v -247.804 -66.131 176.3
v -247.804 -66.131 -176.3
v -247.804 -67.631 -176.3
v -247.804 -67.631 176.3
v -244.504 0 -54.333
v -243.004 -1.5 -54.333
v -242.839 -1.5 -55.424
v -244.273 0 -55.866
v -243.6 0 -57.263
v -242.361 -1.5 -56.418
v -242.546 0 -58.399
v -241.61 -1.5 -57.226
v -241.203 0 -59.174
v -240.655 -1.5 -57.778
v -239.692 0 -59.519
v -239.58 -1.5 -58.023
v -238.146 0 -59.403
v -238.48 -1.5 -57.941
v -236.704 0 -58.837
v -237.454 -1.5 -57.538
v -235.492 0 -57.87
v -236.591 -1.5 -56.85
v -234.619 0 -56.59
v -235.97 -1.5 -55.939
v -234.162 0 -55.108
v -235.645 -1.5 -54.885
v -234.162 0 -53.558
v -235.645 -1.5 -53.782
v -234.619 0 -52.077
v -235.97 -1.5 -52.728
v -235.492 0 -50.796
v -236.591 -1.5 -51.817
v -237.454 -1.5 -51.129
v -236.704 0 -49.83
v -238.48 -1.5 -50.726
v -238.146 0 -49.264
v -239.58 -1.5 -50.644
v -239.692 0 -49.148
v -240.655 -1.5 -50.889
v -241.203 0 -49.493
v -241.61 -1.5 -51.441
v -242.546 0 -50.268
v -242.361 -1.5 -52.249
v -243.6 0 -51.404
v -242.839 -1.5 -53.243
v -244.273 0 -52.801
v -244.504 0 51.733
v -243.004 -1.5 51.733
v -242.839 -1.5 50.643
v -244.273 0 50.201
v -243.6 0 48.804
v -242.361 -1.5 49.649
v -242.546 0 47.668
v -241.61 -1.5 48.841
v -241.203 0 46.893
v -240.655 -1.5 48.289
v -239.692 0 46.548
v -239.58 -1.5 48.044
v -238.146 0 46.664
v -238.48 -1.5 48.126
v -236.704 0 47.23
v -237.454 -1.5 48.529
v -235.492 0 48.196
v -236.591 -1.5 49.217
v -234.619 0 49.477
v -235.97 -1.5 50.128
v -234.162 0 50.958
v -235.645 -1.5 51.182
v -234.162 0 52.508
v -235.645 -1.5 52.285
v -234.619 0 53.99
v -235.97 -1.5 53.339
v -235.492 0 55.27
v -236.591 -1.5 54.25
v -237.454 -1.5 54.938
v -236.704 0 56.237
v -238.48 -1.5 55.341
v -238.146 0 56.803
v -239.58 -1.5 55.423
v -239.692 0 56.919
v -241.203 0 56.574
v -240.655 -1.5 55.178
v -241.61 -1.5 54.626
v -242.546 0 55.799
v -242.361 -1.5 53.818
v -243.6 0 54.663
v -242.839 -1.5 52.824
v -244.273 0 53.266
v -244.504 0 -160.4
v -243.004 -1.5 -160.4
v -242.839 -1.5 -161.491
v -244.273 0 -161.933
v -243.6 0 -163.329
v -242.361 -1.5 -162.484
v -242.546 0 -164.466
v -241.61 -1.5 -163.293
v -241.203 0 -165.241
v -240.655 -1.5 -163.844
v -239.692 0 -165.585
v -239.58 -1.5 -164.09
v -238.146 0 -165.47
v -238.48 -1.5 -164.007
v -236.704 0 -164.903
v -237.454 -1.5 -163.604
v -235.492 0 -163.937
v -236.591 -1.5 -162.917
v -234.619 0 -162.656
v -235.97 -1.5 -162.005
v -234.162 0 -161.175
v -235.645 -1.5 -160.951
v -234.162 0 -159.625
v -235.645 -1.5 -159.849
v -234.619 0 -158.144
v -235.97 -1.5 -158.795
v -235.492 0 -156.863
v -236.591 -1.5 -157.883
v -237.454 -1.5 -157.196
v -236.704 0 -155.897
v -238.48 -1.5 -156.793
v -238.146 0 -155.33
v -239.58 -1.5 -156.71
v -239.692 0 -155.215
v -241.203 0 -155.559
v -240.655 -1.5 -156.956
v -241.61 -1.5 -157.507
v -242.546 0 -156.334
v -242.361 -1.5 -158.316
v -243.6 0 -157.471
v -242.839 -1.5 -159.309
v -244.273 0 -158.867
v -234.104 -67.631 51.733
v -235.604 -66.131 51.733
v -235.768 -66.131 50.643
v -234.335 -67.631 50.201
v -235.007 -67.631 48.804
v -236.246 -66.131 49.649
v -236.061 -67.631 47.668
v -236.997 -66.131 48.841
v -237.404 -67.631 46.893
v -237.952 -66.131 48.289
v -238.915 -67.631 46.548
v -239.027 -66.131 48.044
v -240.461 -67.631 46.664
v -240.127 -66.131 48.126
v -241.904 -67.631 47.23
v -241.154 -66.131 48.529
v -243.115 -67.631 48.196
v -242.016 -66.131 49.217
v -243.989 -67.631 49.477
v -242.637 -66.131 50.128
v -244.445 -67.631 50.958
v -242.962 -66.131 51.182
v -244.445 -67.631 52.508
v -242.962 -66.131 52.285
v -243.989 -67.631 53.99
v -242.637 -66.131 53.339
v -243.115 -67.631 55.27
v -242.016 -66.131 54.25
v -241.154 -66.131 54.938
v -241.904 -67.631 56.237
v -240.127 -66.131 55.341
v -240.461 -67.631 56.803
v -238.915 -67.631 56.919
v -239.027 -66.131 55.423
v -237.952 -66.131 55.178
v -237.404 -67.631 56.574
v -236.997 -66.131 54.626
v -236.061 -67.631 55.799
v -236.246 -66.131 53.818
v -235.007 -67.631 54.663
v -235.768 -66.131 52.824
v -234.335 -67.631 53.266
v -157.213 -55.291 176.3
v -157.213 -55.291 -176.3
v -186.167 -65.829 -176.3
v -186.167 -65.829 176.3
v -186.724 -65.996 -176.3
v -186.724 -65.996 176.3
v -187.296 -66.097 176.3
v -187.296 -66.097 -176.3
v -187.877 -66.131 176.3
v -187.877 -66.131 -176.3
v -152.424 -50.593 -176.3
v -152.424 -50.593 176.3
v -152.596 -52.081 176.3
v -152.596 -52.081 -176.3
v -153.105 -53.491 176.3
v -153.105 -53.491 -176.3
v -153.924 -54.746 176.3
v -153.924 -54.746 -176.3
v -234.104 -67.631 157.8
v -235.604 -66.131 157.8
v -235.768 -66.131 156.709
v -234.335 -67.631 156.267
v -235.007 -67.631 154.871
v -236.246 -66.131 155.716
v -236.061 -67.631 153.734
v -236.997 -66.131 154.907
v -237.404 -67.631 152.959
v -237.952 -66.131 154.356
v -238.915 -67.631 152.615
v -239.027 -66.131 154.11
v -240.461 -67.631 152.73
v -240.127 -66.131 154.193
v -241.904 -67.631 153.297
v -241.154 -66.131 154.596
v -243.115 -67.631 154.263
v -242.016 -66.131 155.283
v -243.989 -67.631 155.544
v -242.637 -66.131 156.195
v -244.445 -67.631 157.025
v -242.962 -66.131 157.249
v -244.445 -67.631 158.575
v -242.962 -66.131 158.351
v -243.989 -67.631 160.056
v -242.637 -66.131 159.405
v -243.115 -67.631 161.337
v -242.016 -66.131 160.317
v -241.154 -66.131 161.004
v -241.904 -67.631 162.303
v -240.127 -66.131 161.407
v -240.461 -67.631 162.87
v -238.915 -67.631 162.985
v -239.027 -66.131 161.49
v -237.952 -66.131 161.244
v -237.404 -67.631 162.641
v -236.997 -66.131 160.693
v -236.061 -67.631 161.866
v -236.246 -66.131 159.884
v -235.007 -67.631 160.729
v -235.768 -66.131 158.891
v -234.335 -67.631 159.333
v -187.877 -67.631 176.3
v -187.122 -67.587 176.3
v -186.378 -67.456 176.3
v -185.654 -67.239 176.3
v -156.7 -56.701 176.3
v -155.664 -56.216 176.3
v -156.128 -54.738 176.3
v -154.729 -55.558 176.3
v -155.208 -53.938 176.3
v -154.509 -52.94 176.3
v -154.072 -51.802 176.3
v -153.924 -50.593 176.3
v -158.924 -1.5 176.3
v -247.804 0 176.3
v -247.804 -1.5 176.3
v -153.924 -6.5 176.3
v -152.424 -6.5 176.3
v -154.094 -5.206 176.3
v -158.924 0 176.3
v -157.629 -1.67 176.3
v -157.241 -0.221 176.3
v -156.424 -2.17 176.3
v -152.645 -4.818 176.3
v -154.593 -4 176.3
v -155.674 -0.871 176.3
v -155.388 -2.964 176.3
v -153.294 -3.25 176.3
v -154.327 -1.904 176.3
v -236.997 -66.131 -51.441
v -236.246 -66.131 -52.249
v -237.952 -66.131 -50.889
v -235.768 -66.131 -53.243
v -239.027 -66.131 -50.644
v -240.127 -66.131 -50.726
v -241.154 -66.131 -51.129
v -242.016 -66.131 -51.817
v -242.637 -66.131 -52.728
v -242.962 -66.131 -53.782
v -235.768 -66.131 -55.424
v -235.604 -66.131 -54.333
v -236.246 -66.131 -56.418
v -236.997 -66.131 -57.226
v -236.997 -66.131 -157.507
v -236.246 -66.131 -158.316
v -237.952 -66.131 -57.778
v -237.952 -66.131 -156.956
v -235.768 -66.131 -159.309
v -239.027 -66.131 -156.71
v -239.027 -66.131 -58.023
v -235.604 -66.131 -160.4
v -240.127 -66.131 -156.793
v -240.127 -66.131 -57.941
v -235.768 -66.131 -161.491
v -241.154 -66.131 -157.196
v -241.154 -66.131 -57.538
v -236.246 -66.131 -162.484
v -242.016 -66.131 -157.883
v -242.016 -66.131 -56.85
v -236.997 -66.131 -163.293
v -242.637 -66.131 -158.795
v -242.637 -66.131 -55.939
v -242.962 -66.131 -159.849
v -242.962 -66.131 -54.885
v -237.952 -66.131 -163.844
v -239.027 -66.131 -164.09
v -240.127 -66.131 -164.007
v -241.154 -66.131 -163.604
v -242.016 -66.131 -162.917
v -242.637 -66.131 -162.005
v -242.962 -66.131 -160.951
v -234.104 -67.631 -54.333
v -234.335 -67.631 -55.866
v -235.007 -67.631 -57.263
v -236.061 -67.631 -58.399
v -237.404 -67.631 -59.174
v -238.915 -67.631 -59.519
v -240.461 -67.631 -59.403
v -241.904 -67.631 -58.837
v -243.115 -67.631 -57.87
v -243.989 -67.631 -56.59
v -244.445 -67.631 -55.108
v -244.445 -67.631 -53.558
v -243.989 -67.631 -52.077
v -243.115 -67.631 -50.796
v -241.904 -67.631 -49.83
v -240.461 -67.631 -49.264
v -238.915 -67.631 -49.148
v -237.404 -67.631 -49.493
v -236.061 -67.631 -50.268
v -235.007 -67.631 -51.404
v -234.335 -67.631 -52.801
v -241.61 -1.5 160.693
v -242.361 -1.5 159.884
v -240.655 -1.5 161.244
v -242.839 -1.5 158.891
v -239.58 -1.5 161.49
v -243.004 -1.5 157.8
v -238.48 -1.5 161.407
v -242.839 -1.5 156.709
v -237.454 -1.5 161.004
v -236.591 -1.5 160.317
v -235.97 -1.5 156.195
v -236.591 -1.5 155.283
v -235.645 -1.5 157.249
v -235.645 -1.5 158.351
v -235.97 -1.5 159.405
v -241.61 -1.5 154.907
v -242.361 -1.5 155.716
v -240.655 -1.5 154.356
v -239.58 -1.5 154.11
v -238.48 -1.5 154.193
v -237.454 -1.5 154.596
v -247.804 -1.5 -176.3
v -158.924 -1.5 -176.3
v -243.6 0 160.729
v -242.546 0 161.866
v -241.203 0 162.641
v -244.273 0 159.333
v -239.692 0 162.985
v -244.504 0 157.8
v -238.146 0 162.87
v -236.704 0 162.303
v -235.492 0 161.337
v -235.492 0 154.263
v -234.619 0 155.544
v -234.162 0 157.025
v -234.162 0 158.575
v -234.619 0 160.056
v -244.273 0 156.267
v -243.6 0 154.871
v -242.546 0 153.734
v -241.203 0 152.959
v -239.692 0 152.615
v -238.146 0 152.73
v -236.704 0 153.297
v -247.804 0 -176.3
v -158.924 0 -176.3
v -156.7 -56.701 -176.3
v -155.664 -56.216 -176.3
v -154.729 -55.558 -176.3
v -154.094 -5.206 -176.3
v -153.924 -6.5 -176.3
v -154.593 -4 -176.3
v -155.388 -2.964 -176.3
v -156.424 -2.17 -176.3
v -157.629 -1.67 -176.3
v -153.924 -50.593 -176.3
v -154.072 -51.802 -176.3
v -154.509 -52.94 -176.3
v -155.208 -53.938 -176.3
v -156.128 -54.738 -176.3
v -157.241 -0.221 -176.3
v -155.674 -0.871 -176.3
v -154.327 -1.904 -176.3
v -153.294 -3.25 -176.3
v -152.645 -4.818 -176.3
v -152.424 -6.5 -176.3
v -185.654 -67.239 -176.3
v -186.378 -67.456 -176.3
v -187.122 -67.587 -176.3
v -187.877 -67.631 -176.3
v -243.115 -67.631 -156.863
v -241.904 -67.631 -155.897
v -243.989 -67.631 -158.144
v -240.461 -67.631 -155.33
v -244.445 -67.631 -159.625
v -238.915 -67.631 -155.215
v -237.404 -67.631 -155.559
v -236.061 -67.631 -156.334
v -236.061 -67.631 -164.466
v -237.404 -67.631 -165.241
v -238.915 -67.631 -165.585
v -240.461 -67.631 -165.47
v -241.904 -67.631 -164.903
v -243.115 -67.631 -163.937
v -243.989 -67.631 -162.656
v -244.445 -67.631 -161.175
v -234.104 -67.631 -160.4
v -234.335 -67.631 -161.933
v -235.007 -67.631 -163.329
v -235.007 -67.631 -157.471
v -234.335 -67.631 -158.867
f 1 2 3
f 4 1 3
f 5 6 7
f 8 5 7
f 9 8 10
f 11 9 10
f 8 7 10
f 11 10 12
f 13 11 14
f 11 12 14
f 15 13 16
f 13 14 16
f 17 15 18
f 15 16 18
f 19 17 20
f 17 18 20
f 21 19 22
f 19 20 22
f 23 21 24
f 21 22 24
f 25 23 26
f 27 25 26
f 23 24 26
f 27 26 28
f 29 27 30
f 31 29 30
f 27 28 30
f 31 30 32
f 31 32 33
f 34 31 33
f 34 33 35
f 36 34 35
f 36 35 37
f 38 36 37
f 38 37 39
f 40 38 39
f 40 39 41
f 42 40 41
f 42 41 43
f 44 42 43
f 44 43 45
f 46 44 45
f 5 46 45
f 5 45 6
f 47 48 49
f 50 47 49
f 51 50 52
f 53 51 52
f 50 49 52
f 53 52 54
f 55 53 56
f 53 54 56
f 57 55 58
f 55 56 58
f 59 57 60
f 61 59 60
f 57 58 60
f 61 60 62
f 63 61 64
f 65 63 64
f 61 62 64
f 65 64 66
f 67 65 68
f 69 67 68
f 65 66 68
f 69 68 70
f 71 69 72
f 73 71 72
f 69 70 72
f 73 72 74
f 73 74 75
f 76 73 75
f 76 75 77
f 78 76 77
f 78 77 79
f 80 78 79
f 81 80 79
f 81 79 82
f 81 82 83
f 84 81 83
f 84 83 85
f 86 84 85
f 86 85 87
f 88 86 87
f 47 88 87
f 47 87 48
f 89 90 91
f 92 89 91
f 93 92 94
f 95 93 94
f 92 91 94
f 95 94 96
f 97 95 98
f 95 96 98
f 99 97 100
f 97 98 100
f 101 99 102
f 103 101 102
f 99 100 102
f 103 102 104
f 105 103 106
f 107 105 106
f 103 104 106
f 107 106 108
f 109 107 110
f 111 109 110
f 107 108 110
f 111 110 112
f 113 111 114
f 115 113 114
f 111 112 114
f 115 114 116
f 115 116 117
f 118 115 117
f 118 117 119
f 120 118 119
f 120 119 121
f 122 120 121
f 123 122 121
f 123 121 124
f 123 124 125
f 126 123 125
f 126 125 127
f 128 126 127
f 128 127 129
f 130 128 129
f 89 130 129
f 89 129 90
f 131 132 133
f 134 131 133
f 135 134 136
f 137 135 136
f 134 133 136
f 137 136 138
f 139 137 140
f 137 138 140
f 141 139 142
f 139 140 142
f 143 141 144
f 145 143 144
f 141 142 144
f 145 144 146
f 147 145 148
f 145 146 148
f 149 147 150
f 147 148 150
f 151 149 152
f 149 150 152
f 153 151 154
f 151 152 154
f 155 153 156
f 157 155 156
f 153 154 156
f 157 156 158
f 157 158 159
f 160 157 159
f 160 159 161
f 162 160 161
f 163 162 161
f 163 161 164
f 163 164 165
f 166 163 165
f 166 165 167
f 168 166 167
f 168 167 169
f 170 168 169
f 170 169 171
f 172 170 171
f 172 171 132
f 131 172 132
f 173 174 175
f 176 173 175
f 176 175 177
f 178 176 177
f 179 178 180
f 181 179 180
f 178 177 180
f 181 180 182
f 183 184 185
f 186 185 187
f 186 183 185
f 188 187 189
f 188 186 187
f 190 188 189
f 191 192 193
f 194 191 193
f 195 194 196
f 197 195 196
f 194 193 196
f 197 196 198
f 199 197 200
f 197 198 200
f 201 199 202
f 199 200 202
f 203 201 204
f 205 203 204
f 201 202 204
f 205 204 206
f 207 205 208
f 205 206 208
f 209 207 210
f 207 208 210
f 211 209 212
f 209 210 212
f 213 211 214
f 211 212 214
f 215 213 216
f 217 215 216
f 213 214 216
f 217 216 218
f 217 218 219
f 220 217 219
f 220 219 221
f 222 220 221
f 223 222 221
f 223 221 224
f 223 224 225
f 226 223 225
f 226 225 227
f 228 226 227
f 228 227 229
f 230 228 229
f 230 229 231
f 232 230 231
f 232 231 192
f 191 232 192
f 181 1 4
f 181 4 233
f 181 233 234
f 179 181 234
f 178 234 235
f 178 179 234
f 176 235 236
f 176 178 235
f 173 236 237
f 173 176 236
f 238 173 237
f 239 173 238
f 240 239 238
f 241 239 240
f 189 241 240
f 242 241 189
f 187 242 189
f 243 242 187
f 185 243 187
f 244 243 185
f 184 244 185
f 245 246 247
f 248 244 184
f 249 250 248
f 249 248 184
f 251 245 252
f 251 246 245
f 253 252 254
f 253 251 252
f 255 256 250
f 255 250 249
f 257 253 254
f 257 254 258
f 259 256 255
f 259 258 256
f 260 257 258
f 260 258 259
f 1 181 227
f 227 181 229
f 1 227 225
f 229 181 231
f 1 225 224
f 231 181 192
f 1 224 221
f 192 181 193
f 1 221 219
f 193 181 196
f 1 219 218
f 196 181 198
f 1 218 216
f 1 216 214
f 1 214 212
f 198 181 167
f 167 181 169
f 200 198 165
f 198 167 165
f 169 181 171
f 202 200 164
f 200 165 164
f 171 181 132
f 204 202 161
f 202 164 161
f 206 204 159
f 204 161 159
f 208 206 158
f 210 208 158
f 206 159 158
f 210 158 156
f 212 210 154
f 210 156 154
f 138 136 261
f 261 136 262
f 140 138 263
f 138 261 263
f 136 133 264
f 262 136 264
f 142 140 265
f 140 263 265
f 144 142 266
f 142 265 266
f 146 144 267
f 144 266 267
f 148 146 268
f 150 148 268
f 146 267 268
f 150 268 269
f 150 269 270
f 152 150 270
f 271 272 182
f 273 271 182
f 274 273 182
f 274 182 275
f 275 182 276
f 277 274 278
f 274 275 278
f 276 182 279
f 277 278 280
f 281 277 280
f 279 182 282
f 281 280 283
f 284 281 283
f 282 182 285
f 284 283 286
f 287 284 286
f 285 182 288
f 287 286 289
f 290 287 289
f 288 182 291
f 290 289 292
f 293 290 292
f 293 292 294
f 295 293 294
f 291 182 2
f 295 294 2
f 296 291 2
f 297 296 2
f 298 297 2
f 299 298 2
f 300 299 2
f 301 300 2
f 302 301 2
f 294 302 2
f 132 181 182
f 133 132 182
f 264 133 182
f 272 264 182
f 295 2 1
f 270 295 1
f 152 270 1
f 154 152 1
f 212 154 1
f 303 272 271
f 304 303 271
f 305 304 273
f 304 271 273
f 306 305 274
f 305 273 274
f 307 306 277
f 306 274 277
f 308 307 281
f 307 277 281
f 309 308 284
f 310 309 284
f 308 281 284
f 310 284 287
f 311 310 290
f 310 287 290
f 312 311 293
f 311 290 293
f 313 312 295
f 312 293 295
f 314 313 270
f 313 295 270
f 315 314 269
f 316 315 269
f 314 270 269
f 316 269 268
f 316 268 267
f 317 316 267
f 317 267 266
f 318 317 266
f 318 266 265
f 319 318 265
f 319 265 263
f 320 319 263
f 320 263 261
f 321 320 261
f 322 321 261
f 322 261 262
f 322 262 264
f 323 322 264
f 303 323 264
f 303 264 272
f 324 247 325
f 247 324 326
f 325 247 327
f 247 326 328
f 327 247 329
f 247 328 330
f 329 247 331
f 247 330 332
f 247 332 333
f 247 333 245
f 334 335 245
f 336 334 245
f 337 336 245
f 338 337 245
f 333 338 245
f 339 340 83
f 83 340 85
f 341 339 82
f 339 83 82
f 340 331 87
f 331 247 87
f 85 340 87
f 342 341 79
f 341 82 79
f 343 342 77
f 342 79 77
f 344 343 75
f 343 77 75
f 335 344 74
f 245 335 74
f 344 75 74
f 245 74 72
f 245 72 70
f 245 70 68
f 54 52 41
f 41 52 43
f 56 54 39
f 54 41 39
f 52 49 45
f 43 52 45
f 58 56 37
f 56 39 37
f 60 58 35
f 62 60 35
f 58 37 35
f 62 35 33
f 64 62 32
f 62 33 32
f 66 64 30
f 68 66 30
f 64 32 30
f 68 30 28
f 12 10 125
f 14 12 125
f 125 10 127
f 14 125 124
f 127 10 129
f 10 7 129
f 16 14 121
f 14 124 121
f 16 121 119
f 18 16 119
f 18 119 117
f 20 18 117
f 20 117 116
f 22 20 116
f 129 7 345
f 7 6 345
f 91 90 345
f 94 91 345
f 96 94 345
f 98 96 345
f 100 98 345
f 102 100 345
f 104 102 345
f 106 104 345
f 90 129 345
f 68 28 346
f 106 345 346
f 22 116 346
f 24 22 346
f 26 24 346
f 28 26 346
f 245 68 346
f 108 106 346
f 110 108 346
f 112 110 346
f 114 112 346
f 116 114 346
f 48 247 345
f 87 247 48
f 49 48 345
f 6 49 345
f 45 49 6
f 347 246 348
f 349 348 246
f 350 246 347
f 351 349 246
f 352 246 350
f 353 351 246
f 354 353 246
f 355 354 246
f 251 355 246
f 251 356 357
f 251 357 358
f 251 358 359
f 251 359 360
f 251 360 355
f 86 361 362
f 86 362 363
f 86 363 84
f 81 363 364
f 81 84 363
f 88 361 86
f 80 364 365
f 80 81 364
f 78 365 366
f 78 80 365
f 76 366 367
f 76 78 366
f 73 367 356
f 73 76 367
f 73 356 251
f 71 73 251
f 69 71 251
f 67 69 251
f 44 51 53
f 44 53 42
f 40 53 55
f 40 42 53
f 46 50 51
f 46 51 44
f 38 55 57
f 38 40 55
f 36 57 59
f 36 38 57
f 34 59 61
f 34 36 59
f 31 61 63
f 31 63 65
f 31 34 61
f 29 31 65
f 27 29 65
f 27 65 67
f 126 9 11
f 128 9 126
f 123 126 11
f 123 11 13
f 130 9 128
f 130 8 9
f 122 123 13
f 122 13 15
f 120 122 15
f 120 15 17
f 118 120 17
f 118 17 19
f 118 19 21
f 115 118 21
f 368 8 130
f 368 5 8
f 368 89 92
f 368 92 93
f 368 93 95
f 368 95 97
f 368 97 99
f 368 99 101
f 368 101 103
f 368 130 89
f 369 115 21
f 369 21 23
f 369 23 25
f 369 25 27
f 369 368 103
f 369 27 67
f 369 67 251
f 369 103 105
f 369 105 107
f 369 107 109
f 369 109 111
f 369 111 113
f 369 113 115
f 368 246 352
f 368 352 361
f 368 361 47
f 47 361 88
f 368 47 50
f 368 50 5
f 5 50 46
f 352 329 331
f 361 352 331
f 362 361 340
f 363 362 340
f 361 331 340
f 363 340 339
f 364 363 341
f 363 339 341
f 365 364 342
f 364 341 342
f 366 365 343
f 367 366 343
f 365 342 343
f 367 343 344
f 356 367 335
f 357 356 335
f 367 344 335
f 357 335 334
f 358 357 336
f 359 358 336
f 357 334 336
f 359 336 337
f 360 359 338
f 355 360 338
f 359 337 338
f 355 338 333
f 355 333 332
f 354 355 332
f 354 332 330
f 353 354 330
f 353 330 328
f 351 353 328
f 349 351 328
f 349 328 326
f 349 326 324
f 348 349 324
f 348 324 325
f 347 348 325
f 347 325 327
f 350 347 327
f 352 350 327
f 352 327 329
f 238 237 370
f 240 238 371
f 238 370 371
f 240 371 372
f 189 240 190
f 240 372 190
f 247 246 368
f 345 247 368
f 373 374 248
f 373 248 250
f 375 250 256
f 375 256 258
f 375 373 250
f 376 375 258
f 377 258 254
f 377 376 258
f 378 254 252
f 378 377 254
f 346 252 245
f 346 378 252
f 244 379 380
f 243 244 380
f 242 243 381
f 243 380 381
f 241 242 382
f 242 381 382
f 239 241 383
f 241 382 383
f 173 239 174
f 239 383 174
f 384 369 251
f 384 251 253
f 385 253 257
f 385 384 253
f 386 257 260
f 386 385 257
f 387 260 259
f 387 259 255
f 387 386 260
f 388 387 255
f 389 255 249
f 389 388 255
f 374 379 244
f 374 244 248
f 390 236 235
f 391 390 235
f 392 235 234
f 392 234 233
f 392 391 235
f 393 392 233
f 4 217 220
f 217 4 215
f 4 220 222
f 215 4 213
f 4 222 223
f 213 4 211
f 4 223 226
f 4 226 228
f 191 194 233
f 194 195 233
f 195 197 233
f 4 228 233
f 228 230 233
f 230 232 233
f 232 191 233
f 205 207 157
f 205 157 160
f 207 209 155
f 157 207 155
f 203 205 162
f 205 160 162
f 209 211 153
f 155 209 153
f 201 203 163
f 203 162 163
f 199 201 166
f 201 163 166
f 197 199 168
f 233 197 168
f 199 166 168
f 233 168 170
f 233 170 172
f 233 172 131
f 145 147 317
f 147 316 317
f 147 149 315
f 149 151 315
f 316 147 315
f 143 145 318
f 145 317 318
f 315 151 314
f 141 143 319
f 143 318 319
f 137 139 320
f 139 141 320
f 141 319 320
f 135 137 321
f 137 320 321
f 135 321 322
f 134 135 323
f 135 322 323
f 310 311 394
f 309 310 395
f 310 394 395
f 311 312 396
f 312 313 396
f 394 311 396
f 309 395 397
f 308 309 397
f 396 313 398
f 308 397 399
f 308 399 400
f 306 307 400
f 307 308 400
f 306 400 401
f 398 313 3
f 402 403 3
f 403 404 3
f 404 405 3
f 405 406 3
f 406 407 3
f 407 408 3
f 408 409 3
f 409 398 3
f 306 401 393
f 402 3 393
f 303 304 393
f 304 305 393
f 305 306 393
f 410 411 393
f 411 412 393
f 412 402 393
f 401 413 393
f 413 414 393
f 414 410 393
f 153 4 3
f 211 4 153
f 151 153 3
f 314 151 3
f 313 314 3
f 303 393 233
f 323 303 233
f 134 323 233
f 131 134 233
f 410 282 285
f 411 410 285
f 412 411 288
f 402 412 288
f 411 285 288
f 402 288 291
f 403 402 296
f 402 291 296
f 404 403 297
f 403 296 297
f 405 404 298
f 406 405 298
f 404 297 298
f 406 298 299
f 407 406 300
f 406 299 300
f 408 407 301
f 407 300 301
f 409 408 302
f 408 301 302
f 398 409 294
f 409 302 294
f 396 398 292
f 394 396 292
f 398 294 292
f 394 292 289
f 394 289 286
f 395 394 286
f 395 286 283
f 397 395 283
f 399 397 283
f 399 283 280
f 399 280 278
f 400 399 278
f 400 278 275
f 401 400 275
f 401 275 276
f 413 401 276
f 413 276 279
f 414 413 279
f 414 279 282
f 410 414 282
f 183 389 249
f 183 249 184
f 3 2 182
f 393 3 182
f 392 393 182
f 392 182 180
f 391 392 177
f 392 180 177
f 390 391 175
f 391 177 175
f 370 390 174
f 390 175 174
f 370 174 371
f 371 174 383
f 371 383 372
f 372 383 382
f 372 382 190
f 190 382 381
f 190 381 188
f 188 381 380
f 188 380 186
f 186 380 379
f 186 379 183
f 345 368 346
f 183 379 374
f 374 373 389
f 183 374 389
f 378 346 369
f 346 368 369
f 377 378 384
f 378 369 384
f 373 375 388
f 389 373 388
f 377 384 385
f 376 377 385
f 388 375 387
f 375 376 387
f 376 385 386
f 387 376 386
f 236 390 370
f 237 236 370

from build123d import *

# Parameters (mm, degrees)
CROQUIS2_W                                           = 95.38
CROQUIS2_H                                           = 352.6
BRIDA_BASE1_DEPTH                                    = 1.5
BRIDA_DE_ARISTA1_STRIP_W                             = 16
BRIDA_DE_ARISTA1_STRIP_H                             = 1.5
BRIDA_DE_ARISTA1_STRIP_CUT_DEPTH                     = 352.6
BRIDA_DE_ARISTA1_DEPTH                               = 352.6
BRIDA_START                                          = -176.3
BRIDA_DE_ARISTA2_DEPTH                               = 352.6
BRIDA_DE_ARISTA2_2_DEPTH                             = 352.6
BRIDA_DE_ARISTA3_DEPTH                               = 352.6
BRIDA_DE_ARISTA3_2_DEPTH                             = 352.6
CROQUIS22_R                                          = 2.25
CORTAR_EXTRUIR4_DEPTH                                = 312.548097
AVELLANADO_PARA_TORNILLO_CON_CABEZA_PLAN_D           = 5.5
AVELLANADO_PARA_TORNILLO_CON_CABEZA_PLAN_CSINK_D     = 10.4
AVELLANADO_PARA_TORNILLO_CON_CABEZA_PLAN_CSINK_ANGLE = 90
AVELLANADO_PARA_TORNILLO_CON_CABEZA_2_D              = 5.5
AVELLANADO_PARA_TORNILLO_CON_CABEZA_2_CSINK_D        = 10.4
AVELLANADO_PARA_TORNILLO_CON_CABEZA_2_CSINK_ANGLE    = 90


# Read off the part's stored shape, not the designer's step: Brida de arista2, Brida de arista3
# Sheet-metal steps are written as plain solids
with BuildPart() as part:
    # Croquis2 → Brida base1 (new body)
    with BuildSketch(Plane(origin=(0, 0, 0), x_dir=(1, 0, 0), z_dir=(0, 1, 0))):
        with Locations((-200.113558854, 0)):
            Rectangle(CROQUIS2_W, CROQUIS2_H)
    extrude(amount=-BRIDA_BASE1_DEPTH)

    # Brida de arista1 strip (across the edge) → Brida de arista1 strip cut (cut)
    with BuildSketch(Plane(origin=(-152.423558854, -1.5, -176.3), x_dir=(-1, 0, 0), z_dir=(0, 0, 1))):
        with Locations((-1.5, -0.75)):
            Rectangle(BRIDA_DE_ARISTA1_STRIP_W, BRIDA_DE_ARISTA1_STRIP_H)
    extrude(amount=BRIDA_DE_ARISTA1_STRIP_CUT_DEPTH, mode=Mode.SUBTRACT)

    # Brida de arista1 section (across the edge) → Brida de arista1 (add)
    with BuildSketch(Plane(origin=(-152.423558854, -1.5, -176.3), x_dir=(-1, 0, 0), z_dir=(0, 0, 1))):
        with BuildLine():
            Line((0, 5), (0, 54.19))
            Line((0, 54.19), (1.5, 54.19))
            Line((1.5, 54.19), (1.5, 5))
            ThreePointArc((1.5, 5), (2.964466094, 1.464466094), (6.5, 0))
            Line((6.5, 0), (6.5, -1.5))
            ThreePointArc((6.5, -1.5), (1.903805922, 0.403805922), (0, 5))
        make_face()
    extrude(amount=BRIDA_DE_ARISTA1_DEPTH)

    # Brida de arista2 outline → Brida de arista2 (cut)
    with BuildSketch(Plane.XY.offset(BRIDA_START)):
        with BuildLine():
            ThreePointArc((-152.423558854, -50.59269565), (-152.810049223, -52.800635867), (-153.923558854, -54.746007582))
            Line((-153.923558854, -54.746007582), (-153.923558854, -55.69))
            Line((-153.923558854, -55.69), (-152.423558854, -55.69))
            Line((-152.423558854, -55.69), (-152.423558854, -50.59269565))
        make_face()
    extrude(amount=BRIDA_DE_ARISTA2_DEPTH, mode=Mode.SUBTRACT)

    # Brida de arista2 2 outline → Brida de arista2 2 (add)
    with BuildSketch(Plane.XY.offset(BRIDA_START)):
        with BuildLine():
            Line((-190.603270036, -69.040323072), (-156.700427922, -56.700697685))
            ThreePointArc((-156.700427922, -56.700697685), (-155.182087424, -55.90789946), (-153.923558854, -54.746007582))
            Line((-153.923558854, -54.746007582), (-153.923558854, -50.59269565))
            ThreePointArc((-153.923558854, -50.59269565), (-154.827798632, -53.460577832), (-157.213458137, -55.291158754))
            Line((-157.213458137, -55.291158754), (-191.116300251, -67.630784141))
            Line((-191.116300251, -67.630784141), (-190.603270036, -69.040323072))
        make_face()
    extrude(amount=BRIDA_DE_ARISTA2_2_DEPTH)

    # Brida de arista3 outline → Brida de arista3 (cut)
    with BuildSketch(Plane.XY.offset(BRIDA_START)):
        with BuildLine():
            Line((-187.876719026, -67.630784141), (-191.116300251, -67.630784141))
            Line((-191.116300251, -67.630784141), (-190.603270036, -69.040323072))
            Line((-190.603270036, -69.040323072), (-185.653588094, -67.238786176))
            ThreePointArc((-185.653588094, -67.238786176), (-186.748005871, -67.532034535), (-187.876719026, -67.630784141))
        make_face()
    extrude(amount=BRIDA_DE_ARISTA3_DEPTH, mode=Mode.SUBTRACT)

    # Brida de arista3 2 outline → Brida de arista3 2 (add)
    with BuildSketch(Plane.XY.offset(BRIDA_START)):
        with BuildLine():
            Line((-247.803558854, -66.130784141), (-247.803558854, -67.630784141))
            Line((-247.803558854, -67.630784141), (-191.116300251, -67.630784141))
            Line((-191.116300251, -67.630784141), (-186.166618309, -65.829247245))
            ThreePointArc((-186.166618309, -65.829247245), (-187.008478137, -66.054822906), (-187.876719026, -66.130784141))
            Line((-187.876719026, -66.130784141), (-247.803558854, -66.130784141))
        make_face()
    extrude(amount=BRIDA_DE_ARISTA3_2_DEPTH)

    # Croquis22 → Cortar-Extruir4 (cut, through all)
    with BuildSketch(Plane.XZ):
        with Locations(Location((-239.303558854, 157.8, 0), (0, 0, 180))):
            Circle(CROQUIS22_R)
        with Locations(Location((-239.303558854, 51.733333333, 0), (0, 0, 180))):
            Circle(CROQUIS22_R)
        with Locations(Location((-239.303558854, -54.333333333, 0), (0, 0, 180))):
            Circle(CROQUIS22_R)
        with Locations(Location((-239.303558854, -160.4, 0), (0, 0, 180))):
            Circle(CROQUIS22_R)
    extrude(amount=CORTAR_EXTRUIR4_DEPTH, mode=Mode.SUBTRACT)

    # Avellanado para tornillo con cabeza plan (through all)
    with Locations(Plane(origin=(0, 0, 0), x_dir=(1, 0, 0), z_dir=(0, 1, 0))):
        with Locations((-239.303558854, 160.4), (-239.303558854, 54.333333333), (-239.303558854, -51.733333333), (-239.303558854, -157.8)):
            CounterSinkHole(AVELLANADO_PARA_TORNILLO_CON_CABEZA_PLAN_D / 2, AVELLANADO_PARA_TORNILLO_CON_CABEZA_PLAN_CSINK_D / 2, counter_sink_angle=AVELLANADO_PARA_TORNILLO_CON_CABEZA_PLAN_CSINK_ANGLE)

    # Avellanado para tornillo con cabeza  2 (through all)
    with Locations(Plane(origin=(0, -67.630784141, 0), x_dir=(-1, 0, 0), z_dir=(0, -1, 0))):
        with Locations((239.303558854, 160.4), (239.303558854, 54.333333333), (239.303558854, -51.733333333), (239.303558854, -157.8)):
            CounterSinkHole(AVELLANADO_PARA_TORNILLO_CON_CABEZA_2_D / 2, AVELLANADO_PARA_TORNILLO_CON_CABEZA_2_CSINK_D / 2, counter_sink_angle=AVELLANADO_PARA_TORNILLO_CON_CABEZA_2_CSINK_ANGLE)


solid = part.part
